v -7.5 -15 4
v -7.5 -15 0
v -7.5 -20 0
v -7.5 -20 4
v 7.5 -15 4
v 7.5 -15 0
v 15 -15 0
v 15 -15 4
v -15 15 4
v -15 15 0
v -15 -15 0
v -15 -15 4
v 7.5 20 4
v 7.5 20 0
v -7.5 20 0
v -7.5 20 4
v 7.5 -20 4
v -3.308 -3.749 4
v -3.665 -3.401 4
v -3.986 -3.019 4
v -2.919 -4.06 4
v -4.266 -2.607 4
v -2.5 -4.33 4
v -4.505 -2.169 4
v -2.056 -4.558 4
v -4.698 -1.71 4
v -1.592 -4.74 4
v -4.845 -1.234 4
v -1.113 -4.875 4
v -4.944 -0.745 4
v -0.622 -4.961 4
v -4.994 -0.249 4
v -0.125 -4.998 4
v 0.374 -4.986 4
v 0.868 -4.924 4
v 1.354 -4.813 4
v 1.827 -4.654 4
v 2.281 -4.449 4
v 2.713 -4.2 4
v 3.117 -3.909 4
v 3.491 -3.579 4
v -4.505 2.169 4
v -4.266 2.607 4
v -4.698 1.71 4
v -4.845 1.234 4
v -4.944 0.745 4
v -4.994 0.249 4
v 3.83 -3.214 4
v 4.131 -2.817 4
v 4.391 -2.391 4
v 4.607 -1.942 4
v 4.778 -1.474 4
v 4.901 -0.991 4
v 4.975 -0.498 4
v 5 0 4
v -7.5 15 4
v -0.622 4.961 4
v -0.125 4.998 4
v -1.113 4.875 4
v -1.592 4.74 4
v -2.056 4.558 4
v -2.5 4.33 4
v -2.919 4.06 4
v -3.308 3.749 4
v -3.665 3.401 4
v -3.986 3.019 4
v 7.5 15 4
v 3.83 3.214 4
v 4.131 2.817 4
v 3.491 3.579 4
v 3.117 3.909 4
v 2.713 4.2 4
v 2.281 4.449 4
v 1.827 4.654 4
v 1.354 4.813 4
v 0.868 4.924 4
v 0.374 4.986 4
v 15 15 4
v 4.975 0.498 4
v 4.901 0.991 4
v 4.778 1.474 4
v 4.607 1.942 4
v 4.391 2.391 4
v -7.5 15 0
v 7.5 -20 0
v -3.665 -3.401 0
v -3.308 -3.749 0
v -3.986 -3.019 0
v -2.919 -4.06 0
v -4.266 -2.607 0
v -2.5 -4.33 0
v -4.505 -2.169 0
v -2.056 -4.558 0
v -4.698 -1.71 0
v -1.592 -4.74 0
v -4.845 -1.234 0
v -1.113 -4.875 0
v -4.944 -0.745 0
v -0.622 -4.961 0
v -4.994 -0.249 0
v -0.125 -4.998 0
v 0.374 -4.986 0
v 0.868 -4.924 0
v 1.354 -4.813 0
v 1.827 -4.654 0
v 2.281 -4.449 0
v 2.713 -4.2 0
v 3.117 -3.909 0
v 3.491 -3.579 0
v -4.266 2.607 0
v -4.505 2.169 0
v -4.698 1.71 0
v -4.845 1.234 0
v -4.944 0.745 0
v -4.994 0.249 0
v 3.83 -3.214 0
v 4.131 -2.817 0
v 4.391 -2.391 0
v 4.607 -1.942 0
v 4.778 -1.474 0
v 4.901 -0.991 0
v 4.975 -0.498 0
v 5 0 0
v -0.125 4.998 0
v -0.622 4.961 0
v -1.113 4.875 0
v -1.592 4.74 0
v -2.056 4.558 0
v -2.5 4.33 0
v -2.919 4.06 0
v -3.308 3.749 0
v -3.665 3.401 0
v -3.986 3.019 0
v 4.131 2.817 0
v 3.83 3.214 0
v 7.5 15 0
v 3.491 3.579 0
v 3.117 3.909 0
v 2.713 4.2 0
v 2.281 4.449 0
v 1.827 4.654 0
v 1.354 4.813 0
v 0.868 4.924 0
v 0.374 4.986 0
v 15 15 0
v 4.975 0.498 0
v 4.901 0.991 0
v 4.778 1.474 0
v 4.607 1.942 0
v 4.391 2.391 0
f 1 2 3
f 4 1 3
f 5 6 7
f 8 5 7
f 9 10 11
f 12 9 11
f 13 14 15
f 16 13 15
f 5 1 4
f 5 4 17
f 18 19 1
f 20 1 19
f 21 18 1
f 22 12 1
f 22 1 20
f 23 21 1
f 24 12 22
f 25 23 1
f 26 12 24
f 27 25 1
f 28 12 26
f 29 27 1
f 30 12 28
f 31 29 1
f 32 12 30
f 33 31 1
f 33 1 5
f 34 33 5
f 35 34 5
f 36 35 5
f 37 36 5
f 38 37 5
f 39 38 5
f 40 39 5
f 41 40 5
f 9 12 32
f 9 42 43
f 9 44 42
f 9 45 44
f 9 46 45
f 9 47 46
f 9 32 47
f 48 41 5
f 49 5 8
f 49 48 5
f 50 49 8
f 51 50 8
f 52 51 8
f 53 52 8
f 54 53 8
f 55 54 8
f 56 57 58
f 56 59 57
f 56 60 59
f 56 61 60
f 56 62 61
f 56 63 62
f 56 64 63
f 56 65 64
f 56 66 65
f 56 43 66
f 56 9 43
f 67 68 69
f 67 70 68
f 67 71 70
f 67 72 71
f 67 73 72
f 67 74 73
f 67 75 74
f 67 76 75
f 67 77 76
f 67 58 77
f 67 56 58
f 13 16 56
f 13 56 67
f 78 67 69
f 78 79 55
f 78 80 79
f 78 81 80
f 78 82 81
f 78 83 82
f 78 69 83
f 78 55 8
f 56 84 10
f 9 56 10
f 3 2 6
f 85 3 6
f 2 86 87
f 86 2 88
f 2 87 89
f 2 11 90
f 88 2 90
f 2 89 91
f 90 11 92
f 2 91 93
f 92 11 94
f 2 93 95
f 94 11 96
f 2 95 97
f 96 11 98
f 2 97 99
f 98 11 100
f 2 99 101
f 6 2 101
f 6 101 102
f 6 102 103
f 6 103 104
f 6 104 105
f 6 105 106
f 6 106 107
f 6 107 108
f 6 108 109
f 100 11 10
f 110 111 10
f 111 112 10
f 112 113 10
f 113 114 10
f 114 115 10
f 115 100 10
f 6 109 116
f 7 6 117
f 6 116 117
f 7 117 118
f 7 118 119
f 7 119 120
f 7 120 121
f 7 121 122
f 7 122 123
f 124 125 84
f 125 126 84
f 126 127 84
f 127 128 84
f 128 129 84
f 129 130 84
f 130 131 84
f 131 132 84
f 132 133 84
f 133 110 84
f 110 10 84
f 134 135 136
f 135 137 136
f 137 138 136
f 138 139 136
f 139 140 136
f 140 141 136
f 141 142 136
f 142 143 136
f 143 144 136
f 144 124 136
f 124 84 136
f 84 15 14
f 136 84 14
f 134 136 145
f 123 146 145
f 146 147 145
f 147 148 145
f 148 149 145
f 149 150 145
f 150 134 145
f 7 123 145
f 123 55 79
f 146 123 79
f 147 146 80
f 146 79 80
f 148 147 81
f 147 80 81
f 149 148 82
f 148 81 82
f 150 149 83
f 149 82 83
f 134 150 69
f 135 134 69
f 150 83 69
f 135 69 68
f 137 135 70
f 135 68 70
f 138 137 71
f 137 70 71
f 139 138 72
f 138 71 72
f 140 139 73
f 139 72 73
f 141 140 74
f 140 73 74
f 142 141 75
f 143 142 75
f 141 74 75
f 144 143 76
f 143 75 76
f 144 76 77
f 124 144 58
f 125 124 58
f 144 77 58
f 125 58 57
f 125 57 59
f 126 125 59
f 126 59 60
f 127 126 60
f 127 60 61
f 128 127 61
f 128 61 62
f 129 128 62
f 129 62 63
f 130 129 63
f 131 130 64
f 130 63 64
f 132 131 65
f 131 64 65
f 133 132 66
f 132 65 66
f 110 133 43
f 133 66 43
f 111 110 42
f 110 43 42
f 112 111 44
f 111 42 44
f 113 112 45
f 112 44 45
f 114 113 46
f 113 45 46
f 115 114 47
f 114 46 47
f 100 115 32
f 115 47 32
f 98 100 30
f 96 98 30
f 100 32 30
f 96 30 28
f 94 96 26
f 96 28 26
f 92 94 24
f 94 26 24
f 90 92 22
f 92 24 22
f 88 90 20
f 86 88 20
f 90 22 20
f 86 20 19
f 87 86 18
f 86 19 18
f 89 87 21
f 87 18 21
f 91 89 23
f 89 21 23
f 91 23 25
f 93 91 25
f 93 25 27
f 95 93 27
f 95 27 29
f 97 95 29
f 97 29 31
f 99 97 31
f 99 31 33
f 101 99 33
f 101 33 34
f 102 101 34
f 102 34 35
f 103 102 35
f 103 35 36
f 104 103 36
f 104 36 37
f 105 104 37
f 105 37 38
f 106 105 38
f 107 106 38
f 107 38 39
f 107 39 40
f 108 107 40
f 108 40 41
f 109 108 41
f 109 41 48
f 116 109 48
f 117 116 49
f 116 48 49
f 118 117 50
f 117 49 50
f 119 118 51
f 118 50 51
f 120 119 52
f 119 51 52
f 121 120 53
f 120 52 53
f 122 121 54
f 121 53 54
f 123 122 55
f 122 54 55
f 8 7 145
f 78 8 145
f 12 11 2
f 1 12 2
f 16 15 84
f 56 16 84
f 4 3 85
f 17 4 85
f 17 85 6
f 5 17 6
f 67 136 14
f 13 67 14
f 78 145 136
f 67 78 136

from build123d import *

# Parameters (mm, degrees)
BOSS_EXTRUDE1_DEPTH = 4
SKETCH2_R           = 5
CUT_EXTRUDE1_DEPTH  = 4


with BuildPart() as part:
    # Sketch1 → Boss-Extrude1 (new body)
    with BuildSketch(Plane.XY):
        Polygon((-7.5, 15), (-15, 15), (-15, -15), (-7.5, -15), (-7.5, -20), (7.5, -20), (7.5, -15), (15, -15), (15, 15), (7.5, 15), (7.5, 20), (-7.5, 20), align=None)
    extrude(amount=BOSS_EXTRUDE1_DEPTH)

    # Sketch2 → Cut-Extrude1 (cut)
    with BuildSketch(Plane.XY.offset(4)):
        Circle(SKETCH2_R)
    extrude(amount=-CUT_EXTRUDE1_DEPTH, mode=Mode.SUBTRACT)


solid = part.part
